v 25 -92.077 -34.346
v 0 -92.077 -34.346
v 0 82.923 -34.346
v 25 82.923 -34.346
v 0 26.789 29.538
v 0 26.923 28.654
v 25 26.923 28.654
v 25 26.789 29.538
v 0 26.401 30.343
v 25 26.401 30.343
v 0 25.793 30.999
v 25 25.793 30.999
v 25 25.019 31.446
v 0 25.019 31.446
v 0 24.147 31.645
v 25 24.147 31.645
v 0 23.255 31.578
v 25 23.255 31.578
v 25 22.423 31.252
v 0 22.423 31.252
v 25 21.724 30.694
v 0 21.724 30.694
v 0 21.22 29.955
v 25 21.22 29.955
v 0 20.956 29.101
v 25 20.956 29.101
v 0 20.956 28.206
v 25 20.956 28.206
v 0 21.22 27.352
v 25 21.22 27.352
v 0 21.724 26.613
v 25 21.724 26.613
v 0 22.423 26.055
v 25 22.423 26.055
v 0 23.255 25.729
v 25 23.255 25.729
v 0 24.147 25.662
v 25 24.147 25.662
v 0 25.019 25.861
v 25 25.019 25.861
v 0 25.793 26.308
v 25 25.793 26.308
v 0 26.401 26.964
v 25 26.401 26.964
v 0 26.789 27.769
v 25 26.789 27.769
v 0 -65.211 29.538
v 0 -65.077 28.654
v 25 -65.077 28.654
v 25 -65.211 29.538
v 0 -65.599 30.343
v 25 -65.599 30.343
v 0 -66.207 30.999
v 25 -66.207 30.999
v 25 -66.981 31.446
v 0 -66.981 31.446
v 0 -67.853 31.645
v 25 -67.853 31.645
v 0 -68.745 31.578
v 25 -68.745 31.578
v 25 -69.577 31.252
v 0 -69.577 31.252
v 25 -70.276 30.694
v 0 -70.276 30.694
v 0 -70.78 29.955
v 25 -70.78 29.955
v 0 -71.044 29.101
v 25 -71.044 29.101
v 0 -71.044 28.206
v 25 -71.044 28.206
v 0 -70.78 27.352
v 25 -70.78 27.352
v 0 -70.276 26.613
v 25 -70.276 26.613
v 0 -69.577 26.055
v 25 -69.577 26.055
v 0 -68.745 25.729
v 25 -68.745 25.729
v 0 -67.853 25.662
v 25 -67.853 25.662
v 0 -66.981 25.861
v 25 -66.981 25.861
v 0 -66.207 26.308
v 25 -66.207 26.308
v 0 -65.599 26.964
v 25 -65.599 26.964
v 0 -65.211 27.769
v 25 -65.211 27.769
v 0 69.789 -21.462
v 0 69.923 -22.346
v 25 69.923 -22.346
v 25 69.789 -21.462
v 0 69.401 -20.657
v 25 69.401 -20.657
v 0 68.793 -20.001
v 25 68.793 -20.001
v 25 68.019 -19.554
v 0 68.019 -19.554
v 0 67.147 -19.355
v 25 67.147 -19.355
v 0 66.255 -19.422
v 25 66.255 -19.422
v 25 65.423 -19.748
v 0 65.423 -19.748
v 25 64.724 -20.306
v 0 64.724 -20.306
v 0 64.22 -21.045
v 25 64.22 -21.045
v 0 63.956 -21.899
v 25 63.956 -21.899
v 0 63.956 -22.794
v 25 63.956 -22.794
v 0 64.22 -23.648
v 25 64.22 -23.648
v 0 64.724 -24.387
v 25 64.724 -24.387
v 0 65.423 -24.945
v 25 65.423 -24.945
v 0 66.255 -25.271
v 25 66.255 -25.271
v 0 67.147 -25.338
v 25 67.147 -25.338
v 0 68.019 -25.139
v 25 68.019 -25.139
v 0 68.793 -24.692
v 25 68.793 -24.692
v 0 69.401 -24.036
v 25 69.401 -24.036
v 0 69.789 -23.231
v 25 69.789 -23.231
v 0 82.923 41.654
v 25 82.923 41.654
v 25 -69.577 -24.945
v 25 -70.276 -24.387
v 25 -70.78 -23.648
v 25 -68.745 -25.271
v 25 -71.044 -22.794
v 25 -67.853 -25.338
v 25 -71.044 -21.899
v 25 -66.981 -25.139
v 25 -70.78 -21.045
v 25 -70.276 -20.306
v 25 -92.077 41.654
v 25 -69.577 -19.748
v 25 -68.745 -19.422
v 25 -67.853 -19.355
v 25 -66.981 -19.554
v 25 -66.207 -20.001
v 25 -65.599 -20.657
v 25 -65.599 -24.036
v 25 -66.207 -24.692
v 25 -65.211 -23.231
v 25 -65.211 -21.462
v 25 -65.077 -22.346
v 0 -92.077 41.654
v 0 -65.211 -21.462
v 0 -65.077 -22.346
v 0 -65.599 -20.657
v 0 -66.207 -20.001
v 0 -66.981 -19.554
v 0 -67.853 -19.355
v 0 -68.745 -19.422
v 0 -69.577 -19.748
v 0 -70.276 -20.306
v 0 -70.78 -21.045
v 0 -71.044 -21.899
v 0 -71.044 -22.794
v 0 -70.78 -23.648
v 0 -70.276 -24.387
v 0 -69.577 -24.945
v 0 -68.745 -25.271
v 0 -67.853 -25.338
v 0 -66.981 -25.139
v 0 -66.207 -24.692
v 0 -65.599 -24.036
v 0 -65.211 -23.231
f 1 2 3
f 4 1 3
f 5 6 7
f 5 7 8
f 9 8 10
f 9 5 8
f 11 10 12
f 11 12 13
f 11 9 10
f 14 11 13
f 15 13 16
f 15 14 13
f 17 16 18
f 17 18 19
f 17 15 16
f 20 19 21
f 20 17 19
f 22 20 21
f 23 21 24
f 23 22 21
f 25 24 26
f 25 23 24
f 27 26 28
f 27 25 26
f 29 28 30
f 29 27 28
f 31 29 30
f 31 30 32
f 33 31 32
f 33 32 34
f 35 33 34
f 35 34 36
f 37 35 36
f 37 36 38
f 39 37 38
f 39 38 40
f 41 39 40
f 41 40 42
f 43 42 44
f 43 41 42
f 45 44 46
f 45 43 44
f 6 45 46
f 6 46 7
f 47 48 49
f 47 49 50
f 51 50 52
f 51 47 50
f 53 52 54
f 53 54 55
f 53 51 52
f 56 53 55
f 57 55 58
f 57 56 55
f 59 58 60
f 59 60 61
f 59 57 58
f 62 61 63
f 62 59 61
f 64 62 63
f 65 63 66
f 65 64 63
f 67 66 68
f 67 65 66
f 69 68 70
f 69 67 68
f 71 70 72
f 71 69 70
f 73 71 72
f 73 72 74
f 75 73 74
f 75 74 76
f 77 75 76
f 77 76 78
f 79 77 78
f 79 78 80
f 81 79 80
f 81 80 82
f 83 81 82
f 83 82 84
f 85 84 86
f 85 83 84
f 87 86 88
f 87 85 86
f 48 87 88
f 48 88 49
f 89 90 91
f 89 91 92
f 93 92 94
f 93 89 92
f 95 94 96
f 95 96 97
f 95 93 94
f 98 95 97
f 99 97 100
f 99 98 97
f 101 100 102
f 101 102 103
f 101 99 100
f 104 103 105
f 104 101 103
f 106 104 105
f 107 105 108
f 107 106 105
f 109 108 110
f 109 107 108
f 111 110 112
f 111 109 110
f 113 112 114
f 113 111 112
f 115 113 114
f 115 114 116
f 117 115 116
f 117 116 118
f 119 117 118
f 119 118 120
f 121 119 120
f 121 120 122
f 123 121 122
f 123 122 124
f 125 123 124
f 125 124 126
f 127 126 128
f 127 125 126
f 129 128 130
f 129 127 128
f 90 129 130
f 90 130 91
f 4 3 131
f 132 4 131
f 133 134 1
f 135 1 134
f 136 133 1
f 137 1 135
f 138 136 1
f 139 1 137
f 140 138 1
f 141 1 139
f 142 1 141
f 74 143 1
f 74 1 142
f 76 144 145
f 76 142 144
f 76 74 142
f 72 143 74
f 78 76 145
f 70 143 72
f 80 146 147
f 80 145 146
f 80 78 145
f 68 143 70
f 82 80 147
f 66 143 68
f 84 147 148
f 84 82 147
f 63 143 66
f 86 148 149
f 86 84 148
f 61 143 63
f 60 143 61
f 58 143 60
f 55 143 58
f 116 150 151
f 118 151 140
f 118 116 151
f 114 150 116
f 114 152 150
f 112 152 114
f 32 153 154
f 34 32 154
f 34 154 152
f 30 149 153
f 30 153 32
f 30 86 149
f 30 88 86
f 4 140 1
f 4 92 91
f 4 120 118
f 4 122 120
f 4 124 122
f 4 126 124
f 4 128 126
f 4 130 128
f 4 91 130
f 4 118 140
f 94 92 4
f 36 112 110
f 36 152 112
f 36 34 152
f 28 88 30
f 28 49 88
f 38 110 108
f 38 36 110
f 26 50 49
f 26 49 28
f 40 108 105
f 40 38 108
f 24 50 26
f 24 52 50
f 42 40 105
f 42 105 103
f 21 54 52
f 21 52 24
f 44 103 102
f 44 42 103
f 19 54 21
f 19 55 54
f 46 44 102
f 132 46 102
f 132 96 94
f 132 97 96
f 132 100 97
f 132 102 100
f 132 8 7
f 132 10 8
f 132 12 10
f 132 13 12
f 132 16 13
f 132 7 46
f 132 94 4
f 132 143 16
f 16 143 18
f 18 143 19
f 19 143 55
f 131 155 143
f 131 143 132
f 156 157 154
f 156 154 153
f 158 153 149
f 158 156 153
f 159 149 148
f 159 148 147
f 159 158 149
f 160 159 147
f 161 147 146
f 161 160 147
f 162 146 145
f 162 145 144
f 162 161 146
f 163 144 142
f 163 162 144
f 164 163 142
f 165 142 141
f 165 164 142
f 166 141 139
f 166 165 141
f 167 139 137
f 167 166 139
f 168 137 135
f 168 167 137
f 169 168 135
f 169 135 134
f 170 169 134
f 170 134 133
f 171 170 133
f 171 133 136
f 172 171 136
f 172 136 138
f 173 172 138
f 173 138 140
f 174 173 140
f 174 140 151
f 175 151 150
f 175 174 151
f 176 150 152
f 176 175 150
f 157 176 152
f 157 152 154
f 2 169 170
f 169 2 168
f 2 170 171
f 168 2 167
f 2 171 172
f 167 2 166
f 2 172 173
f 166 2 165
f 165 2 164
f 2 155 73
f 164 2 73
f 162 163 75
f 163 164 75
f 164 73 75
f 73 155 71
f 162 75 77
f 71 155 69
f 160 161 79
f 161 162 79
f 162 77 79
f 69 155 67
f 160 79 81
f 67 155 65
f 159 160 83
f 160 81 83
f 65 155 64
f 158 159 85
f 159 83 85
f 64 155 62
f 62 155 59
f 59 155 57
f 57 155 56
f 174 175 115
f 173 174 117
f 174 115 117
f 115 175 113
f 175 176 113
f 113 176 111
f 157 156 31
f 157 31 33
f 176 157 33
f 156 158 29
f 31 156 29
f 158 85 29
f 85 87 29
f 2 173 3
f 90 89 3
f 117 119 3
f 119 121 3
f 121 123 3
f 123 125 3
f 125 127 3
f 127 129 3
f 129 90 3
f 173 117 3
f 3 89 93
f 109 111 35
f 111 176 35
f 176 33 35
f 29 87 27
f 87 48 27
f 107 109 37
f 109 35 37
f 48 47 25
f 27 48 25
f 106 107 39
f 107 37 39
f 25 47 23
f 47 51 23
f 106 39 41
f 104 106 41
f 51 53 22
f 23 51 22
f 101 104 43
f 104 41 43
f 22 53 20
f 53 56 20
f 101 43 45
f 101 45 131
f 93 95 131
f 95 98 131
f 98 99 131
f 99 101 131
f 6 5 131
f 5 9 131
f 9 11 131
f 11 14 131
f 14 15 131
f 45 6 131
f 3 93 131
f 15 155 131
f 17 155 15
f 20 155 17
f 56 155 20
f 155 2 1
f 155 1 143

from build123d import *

# Parameters (mm, degrees)
F0_W     = 175
F0_H     = 76
F0_R     = 3
F1_DEPTH = 25


with BuildPart() as f1:
    # F0 (on Right) → F1 (new body)
    with BuildSketch(Plane.YZ):
        with Locations((-4.577316, 3.653536)):
            Rectangle(F0_W, F0_H)
        with Locations((-68.077316, -22.346464)):
            Circle(F0_R, mode=Mode.SUBTRACT)
        with Locations((66.922684, -22.346464)):
            Circle(F0_R, mode=Mode.SUBTRACT)
        with Locations((-68.077316, 28.653536)):
            Circle(F0_R, mode=Mode.SUBTRACT)
        with Locations((23.922684, 28.653536)):
            Circle(F0_R, mode=Mode.SUBTRACT)
    extrude(amount=F1_DEPTH)


solid = f1.part
